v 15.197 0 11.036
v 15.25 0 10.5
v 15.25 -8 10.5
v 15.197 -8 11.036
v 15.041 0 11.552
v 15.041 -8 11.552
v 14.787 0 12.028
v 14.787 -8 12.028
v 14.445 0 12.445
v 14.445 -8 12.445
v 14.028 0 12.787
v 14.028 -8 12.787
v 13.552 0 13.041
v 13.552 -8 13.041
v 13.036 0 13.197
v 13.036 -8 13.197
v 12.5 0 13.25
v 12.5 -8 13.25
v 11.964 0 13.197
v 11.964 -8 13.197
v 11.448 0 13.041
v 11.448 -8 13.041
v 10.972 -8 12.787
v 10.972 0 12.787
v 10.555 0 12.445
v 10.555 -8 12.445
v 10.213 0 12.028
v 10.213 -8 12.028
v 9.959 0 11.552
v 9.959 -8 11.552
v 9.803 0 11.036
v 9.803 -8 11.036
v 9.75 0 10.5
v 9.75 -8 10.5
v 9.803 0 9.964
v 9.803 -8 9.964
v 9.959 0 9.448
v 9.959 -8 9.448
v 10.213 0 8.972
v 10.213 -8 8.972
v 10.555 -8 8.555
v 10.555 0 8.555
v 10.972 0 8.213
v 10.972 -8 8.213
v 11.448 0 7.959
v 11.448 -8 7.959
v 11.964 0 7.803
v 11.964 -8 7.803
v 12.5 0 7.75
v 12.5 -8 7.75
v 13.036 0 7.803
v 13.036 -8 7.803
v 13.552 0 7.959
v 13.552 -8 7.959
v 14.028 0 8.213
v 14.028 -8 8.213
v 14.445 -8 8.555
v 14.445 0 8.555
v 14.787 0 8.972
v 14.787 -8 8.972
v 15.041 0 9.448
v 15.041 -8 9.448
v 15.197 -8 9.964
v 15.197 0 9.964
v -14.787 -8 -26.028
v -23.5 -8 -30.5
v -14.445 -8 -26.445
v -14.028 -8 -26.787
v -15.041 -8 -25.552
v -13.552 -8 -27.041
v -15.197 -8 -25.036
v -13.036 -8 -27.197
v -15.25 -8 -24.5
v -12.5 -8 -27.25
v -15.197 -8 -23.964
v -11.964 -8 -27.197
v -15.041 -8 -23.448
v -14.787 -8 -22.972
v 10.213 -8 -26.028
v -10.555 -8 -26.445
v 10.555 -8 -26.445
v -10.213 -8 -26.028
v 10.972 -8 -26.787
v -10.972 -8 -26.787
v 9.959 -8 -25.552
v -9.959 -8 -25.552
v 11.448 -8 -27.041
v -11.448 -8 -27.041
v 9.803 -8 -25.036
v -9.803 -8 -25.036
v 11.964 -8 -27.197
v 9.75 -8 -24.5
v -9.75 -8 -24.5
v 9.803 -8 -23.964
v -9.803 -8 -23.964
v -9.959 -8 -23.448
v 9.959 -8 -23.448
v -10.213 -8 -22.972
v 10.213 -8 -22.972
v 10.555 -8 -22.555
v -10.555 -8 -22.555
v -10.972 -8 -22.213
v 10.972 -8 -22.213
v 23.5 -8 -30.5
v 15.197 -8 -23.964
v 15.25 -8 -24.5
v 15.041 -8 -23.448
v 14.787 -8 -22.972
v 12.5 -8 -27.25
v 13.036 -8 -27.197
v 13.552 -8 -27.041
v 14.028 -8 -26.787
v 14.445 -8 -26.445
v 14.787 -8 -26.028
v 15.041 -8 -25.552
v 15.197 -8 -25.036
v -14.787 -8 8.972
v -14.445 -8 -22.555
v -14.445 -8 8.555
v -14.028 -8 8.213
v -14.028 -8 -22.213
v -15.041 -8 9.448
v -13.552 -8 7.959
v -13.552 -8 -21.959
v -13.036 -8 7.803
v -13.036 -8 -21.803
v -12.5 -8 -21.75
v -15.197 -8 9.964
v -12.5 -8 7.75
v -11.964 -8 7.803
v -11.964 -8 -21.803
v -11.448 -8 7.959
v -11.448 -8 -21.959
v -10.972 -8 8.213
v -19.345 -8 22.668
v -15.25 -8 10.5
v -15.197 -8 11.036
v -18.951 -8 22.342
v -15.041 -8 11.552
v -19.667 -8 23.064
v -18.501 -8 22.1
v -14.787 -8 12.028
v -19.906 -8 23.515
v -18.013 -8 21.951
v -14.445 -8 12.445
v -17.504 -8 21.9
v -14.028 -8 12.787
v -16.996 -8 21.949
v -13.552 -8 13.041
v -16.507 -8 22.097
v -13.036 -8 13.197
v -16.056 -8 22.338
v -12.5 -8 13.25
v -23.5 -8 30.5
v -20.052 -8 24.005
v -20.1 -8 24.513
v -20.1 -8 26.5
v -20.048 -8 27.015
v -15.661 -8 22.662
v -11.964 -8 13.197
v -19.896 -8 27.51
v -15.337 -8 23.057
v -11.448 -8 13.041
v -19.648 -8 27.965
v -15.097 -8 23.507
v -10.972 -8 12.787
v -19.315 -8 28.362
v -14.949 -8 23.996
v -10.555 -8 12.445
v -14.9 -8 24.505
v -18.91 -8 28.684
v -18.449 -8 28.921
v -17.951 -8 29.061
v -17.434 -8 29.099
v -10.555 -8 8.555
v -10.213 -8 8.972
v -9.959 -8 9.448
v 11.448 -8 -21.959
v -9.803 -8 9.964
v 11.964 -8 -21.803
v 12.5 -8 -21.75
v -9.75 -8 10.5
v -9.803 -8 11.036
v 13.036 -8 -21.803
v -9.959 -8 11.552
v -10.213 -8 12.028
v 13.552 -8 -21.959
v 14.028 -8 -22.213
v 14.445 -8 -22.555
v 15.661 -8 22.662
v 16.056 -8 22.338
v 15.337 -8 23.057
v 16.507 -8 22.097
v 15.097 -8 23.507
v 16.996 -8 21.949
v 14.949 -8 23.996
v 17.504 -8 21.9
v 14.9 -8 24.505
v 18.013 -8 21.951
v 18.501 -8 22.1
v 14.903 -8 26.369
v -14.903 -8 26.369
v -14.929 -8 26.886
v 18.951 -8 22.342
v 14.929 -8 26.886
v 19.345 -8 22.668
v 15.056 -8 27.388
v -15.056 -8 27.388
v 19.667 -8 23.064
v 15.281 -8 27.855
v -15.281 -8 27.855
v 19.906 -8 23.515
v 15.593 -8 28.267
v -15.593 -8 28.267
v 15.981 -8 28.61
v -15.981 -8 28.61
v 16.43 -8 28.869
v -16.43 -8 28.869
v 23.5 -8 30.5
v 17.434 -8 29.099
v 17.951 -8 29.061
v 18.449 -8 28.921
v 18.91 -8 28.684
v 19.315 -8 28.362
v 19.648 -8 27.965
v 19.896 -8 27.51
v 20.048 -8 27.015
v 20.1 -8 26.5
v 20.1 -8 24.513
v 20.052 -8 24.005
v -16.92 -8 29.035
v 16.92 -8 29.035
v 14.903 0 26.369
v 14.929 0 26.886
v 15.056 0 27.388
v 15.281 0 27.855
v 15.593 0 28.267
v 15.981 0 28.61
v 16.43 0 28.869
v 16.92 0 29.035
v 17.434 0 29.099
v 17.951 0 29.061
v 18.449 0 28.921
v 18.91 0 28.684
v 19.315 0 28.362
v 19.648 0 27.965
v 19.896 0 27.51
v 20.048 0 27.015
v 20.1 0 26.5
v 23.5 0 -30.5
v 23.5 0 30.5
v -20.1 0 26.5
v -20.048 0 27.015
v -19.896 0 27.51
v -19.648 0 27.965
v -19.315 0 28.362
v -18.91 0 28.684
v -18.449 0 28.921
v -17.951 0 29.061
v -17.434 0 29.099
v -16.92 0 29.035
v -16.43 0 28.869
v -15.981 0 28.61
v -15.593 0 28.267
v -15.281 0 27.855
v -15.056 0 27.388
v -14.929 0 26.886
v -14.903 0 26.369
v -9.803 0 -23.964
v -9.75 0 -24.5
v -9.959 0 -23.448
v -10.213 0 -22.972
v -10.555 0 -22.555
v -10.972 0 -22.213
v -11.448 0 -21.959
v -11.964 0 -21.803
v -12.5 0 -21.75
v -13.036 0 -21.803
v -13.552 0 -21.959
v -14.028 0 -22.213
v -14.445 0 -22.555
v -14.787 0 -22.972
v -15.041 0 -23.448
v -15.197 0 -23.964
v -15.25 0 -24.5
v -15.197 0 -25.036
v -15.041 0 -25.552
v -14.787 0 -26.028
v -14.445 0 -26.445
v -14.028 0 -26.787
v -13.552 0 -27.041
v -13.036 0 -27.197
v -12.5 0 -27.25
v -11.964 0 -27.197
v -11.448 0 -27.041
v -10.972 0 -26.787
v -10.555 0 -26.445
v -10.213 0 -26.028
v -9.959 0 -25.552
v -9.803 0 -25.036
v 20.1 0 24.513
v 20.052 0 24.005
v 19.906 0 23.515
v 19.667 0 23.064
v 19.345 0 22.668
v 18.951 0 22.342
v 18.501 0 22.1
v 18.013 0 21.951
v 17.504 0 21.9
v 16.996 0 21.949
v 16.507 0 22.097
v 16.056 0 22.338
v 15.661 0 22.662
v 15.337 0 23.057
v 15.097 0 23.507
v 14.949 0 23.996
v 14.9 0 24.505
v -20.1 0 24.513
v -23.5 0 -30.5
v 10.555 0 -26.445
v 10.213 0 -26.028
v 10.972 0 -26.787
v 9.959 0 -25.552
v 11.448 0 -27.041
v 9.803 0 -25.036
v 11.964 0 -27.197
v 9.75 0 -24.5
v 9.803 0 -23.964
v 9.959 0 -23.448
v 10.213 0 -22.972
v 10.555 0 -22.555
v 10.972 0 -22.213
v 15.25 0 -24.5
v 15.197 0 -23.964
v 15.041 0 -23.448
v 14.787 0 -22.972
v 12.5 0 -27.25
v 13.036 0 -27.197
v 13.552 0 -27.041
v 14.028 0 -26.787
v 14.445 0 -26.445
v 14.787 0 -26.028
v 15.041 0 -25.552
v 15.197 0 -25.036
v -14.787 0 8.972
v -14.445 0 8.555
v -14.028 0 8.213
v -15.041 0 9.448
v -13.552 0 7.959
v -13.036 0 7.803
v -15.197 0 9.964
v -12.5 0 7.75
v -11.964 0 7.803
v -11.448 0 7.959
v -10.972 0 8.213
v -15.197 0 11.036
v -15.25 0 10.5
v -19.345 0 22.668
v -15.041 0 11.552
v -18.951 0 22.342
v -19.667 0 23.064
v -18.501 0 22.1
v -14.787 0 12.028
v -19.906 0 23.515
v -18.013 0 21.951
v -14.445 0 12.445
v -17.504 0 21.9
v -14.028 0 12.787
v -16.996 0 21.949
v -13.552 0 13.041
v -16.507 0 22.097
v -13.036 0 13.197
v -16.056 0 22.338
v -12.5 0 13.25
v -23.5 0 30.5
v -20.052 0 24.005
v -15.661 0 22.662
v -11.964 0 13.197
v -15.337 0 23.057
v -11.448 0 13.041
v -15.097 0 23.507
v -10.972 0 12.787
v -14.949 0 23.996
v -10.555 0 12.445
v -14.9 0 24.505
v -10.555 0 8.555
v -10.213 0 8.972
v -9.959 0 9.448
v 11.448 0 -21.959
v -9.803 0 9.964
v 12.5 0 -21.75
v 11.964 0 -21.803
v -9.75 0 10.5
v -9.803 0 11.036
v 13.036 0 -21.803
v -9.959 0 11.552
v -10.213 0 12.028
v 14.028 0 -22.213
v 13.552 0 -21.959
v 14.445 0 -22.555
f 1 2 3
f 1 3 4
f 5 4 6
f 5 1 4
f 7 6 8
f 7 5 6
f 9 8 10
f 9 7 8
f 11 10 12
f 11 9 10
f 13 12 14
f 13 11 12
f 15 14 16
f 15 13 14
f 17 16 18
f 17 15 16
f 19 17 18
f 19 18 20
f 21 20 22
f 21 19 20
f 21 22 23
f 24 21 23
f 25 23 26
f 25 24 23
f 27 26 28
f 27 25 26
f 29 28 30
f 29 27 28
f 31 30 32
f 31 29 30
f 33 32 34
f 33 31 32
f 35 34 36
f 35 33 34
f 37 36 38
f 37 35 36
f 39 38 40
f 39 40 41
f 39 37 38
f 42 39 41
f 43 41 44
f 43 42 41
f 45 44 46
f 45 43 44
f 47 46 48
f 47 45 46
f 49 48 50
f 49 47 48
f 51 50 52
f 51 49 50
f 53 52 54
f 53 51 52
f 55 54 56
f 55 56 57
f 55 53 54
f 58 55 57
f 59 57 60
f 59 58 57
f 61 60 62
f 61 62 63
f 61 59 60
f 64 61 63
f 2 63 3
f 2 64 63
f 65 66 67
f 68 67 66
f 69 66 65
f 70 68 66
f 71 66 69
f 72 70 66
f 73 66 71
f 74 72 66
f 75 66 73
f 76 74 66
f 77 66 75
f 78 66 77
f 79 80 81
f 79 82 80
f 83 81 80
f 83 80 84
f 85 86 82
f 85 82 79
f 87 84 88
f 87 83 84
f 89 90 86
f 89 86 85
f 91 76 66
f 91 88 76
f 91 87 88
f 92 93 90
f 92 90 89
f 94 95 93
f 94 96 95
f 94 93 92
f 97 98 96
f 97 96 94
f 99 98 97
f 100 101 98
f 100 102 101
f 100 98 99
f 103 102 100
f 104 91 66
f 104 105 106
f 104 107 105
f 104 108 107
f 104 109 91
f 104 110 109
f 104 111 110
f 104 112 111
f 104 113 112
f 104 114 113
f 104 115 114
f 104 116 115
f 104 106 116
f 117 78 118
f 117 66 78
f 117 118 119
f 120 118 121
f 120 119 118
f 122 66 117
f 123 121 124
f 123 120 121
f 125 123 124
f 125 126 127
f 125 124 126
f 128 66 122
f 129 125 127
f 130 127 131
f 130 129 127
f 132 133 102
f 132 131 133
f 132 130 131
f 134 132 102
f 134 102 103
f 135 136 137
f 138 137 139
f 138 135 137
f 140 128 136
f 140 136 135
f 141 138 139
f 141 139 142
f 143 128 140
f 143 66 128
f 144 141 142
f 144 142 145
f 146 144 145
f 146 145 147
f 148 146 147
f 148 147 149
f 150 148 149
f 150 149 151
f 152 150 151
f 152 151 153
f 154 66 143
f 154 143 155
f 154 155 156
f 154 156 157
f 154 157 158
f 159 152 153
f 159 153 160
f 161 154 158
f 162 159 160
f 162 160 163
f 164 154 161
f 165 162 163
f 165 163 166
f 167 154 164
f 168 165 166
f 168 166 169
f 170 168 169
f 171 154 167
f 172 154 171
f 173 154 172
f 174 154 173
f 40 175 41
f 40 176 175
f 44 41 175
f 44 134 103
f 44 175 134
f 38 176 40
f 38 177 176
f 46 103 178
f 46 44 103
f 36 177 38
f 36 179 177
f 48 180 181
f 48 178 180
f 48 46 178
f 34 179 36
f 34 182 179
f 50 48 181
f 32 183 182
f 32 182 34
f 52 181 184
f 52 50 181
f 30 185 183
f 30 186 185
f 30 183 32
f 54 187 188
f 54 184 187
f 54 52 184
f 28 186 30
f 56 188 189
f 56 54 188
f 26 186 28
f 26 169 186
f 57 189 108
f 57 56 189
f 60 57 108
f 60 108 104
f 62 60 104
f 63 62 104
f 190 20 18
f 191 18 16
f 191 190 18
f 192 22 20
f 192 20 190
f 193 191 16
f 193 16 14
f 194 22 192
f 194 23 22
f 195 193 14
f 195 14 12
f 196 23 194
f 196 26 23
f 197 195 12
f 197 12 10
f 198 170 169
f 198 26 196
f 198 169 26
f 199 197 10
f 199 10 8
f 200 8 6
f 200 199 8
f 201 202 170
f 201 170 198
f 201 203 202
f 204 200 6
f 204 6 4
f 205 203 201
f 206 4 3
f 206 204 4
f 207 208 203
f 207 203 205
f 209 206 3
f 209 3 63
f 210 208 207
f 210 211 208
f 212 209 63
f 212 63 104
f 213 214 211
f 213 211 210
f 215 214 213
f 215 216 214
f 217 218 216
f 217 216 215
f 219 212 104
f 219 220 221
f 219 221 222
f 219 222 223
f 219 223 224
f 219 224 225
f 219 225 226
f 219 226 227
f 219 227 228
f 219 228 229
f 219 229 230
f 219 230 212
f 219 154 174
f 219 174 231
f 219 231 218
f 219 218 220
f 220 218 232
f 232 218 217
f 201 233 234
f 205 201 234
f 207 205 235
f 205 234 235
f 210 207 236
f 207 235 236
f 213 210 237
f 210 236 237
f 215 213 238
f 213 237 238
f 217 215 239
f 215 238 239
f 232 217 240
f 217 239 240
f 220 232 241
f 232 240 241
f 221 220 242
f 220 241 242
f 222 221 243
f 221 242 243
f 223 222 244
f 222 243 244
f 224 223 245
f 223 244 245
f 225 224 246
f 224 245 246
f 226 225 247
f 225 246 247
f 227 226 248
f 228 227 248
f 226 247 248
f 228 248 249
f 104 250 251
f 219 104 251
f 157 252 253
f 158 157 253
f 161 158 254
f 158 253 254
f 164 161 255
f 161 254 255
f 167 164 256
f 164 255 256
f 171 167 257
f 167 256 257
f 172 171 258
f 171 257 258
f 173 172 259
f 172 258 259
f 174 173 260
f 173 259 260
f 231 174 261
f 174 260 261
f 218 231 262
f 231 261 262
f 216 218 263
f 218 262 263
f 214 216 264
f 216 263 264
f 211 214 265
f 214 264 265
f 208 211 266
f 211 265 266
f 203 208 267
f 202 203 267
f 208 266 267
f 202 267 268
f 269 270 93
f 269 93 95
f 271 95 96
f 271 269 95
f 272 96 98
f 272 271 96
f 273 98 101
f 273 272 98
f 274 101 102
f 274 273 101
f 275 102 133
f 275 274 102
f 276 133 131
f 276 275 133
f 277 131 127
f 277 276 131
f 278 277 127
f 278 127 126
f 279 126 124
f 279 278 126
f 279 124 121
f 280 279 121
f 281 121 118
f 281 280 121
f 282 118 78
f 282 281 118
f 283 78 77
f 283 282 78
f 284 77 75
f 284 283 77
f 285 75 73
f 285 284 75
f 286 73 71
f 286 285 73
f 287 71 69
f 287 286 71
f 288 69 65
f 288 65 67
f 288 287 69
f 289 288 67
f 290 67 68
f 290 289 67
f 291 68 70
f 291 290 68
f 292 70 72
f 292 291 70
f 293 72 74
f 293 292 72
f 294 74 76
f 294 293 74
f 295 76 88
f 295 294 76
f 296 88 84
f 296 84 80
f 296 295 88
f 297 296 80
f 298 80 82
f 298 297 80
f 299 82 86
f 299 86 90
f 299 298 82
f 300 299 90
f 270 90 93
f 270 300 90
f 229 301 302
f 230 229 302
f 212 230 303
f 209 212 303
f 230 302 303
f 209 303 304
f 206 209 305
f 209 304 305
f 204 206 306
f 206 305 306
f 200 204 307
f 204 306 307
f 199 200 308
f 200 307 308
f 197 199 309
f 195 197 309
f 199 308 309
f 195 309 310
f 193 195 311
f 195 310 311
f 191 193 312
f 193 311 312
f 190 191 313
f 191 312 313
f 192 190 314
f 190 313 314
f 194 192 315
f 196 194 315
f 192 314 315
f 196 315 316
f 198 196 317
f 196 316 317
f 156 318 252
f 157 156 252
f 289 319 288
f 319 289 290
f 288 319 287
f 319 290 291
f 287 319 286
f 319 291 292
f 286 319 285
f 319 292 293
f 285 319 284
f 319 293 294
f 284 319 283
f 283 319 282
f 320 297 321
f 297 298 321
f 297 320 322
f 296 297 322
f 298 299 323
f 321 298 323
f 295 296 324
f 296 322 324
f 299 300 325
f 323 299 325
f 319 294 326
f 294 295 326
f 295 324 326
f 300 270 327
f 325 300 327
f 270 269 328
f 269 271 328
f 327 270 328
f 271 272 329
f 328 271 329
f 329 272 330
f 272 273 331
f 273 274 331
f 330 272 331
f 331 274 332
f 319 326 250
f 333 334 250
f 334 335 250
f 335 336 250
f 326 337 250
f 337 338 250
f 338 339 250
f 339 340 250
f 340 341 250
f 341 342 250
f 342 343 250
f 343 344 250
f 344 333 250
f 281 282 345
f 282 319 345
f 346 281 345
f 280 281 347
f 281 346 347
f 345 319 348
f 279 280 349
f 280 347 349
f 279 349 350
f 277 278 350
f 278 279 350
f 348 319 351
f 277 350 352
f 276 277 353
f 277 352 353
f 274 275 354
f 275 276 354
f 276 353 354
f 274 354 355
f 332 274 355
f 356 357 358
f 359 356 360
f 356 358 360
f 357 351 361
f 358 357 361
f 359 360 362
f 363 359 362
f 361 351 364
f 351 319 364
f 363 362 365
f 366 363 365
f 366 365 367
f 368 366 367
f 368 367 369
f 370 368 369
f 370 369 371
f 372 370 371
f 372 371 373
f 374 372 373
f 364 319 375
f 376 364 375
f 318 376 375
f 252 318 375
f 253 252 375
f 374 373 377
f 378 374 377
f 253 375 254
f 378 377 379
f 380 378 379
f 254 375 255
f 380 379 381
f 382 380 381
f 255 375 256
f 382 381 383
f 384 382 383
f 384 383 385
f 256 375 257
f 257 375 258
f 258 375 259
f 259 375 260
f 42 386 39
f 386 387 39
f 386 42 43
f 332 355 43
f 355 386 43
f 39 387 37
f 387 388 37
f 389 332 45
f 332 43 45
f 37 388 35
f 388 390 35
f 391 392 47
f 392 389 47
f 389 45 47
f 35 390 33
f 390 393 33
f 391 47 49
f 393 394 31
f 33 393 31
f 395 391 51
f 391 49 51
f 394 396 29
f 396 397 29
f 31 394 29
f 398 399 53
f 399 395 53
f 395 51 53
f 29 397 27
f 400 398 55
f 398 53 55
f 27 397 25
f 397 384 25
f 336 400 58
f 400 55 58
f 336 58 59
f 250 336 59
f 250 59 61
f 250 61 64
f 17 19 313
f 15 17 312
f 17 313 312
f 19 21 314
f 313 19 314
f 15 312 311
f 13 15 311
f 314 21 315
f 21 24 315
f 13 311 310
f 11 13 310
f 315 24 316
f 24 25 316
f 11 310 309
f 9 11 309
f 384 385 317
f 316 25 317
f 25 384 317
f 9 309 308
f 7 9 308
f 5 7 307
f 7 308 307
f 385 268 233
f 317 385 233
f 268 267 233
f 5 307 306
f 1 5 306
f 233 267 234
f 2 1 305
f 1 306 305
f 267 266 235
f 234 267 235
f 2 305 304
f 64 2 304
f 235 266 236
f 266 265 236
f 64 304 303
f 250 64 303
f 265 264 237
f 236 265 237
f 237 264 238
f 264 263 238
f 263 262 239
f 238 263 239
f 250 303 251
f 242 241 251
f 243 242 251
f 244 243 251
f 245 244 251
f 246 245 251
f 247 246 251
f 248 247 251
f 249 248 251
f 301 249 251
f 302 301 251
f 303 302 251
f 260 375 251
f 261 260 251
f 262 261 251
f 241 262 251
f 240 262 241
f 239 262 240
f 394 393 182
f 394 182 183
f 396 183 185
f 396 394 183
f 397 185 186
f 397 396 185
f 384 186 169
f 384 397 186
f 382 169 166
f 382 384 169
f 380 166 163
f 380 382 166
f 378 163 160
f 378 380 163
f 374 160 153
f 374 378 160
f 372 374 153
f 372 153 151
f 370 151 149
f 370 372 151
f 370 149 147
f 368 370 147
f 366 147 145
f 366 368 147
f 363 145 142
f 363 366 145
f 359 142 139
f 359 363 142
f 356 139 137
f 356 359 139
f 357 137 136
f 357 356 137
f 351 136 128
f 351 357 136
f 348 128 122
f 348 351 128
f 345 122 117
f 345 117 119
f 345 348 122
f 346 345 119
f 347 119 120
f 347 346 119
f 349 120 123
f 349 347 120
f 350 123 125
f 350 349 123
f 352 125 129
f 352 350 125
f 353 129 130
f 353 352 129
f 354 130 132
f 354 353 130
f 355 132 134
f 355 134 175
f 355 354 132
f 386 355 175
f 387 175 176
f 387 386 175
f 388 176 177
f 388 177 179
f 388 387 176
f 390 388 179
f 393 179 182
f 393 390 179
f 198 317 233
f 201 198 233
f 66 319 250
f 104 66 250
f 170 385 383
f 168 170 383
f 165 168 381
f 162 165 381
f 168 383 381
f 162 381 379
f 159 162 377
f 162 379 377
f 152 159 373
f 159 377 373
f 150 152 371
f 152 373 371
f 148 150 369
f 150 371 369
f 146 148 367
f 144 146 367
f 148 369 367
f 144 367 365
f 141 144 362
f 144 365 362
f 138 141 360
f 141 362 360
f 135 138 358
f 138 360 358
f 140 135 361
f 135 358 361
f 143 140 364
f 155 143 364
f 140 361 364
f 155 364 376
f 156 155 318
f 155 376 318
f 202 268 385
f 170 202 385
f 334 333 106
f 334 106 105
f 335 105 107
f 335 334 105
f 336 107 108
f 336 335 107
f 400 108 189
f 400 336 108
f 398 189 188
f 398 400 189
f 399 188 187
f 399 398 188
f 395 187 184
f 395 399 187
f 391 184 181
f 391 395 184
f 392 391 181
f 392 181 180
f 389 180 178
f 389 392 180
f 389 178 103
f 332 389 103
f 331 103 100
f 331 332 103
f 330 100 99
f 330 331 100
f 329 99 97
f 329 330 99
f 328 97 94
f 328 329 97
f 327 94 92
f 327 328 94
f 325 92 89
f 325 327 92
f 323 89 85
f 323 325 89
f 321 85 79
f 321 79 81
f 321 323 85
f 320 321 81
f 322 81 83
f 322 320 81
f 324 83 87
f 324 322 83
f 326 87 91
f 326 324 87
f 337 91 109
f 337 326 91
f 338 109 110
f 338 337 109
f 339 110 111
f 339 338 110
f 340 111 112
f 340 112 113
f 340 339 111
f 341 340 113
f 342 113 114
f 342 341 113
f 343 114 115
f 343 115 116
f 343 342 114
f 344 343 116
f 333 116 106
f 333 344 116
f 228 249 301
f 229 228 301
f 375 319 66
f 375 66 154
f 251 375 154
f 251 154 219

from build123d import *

# Parameters (mm, degrees)
F0_W     = 47
F0_H     = 61
F0_R     = 2.75
F1_DEPTH = 8


with BuildPart() as f1:
    # F0 (on Front) → F1 (new body)
    with BuildSketch(Plane.XZ):
        Rectangle(F0_W, F0_H)
        with Locations((-12.5, -24.5)):
            Circle(F0_R, mode=Mode.SUBTRACT)
        with Locations((12.5, -24.5)):
            Circle(F0_R, mode=Mode.SUBTRACT)
        with Locations((-12.5, 10.5)):
            Circle(F0_R, mode=Mode.SUBTRACT)
        with BuildLine():
            ThreePointArc((-14.900004, 24.504627), (-17.504354, 21.900004), (-20.099966, 24.513334))
            Line((-20.099966, 24.513334), (-20.1, 26.499955))
            ThreePointArc((-20.1, 26.499955), (-17.434316, 29.09917), (-14.903321, 26.368629))
            Line((-14.903321, 26.368629), (-14.900004, 24.504627))
        make_face(mode=Mode.SUBTRACT)
        with Locations((12.5, 10.5)):
            Circle(F0_R, mode=Mode.SUBTRACT)
        with BuildLine():
            Line((20.1, 26.499955), (20.099966, 24.513334))
            ThreePointArc((20.099966, 24.513334), (17.504354, 21.900004), (14.900004, 24.504627))
            Line((14.900004, 24.504627), (14.903321, 26.368629))
            ThreePointArc((14.903321, 26.368629), (17.434316, 29.09917), (20.1, 26.499955))
        make_face(mode=Mode.SUBTRACT)
    extrude(amount=F1_DEPTH)


solid = f1.part
